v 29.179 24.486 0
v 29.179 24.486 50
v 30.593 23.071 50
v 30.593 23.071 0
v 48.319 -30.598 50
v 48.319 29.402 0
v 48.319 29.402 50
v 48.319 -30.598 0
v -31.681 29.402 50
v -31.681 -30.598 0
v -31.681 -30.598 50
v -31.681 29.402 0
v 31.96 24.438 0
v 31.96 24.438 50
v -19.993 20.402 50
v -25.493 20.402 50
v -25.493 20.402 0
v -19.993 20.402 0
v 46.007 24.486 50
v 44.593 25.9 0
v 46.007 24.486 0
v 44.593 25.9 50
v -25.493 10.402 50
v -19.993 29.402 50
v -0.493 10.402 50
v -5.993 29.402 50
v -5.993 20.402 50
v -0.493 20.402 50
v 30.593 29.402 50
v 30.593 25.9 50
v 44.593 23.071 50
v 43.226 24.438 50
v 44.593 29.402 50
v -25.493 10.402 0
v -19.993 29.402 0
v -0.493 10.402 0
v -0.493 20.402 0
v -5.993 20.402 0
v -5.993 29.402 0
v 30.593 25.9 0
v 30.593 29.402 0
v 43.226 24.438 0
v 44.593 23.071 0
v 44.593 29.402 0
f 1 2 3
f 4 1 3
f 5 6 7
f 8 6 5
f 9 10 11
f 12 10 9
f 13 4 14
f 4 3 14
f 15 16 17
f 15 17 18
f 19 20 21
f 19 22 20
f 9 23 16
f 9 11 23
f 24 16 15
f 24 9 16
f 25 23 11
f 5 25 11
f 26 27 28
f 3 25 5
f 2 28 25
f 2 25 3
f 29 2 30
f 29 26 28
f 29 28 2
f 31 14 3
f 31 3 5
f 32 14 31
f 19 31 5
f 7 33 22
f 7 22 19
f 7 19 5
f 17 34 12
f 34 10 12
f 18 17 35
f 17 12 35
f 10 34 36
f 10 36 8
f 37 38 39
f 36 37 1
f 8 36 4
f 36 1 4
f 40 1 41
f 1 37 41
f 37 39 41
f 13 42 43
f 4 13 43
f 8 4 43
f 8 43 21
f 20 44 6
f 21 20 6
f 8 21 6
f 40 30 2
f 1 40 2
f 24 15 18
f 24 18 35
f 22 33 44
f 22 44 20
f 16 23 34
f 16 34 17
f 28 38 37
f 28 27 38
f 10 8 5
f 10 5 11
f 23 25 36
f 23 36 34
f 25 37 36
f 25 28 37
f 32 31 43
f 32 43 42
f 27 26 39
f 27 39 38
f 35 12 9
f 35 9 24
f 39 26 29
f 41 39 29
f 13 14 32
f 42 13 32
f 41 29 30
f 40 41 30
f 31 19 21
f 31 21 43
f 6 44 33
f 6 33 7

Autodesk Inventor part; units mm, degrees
ref_plane "YZ Plane" through (0, 0, 0) normal (1, 0, 0) x (0, 1, 0)
ref_plane "XZ Plane" through (0, 0, 0) normal (0, 1, 0) x (-1, 0, 0)
ref_plane "XY Plane" through (0, 0, 0) normal (0, 0, 1) x (1, 0, 0)
sketch "Sketch1" plane through (0, 0, 0) normal (0, 0, 1) x (1, 0, 0)
  line L0 (-31.6809, 29.4017) -> (48.3191, 29.4017)
  line L1 (48.3191, 29.4017) -> (48.3191, -30.5983)
  line L2 (48.3191, -30.5983) -> (-31.6809, -30.5983)
  line L3 (-31.6809, -30.5983) -> (-31.6809, 29.4017)
  point P0 (0, 0)
  dimension "d0" = 80
  dimension "d1" = 60
extrude "Extrusion1" add sketch "Sketch1" along normal blind 50
sketch "Sketch2" plane through (0, 0, 50) normal (0, 0, 1) x (1, 0, 0)
  line L0 (-19.9929, 29.4017) -> (-5.9929, 29.4017)
  line L1 (-5.9929, 29.4017) -> (-5.9929, 20.4017)
  line L2 (-5.9929, 20.4017) -> (-0.4929, 20.4017)
  line L3 (-0.4929, 20.4017) -> (-0.4929, 10.4017)
  line L4 (-0.4929, 10.4017) -> (-25.4929, 10.4017)
  line L5 (-25.4929, 10.4017) -> (-25.4929, 20.4017)
  line L6 (-25.4929, 20.4017) -> (-19.9929, 20.4017)
  line L7 (-19.9929, 20.4017) -> (-19.9929, 29.4017)
  line L8 (48.3191, 29.4017) -> (-31.6809, 29.4017) projected
  point P0 (0, 0)
  point P1 (-12.9929, 29.4017)
  dimension "d4" = 25
  dimension "d5" = 12.5
  dimension "d6" = 7
  dimension "d7" = 14
  dimension "d8" = 9
  dimension "d9" = 10
extrude "Extrusion2" cut sketch "Sketch2" against normal blind 50
sketch "Sketch3" plane through (0, 0, 50) normal (0, 0, 1) x (1, 0, 0)
  line L0 (37.593, 29.4385) -> (44.593, 29.4385)
  line L1 (44.593, 29.4385) -> (44.593, 25.8997)
  line L2 (44.593, 25.8997) -> (46.0072, 24.4855)
  line L3 (46.0072, 24.4855) -> (44.593, 23.0713)
  line L4 (44.593, 23.0713) -> (43.2258, 24.4385)
  line L5 (43.2258, 24.4385) -> (37.593, 24.4385)
  line L6 (37.593, 29.4385) -> (37.593, 24.4385) construction
  line L7 (37.593, 29.4385) -> (30.593, 29.4385)
  line L8 (30.593, 29.4385) -> (30.593, 25.8997)
  line L9 (30.593, 25.8997) -> (29.1788, 24.4855)
  line L10 (29.1788, 24.4855) -> (30.593, 23.0713)
  line L11 (30.593, 23.0713) -> (31.9602, 24.4385)
  line L12 (31.9602, 24.4385) -> (37.593, 24.4385)
  point P0 (0, 0)
  point P1 (31.0916, 30.5867)
  dimension "d23" = 7
  dimension "d24" = 2
  dimension "d26" = 2
  dimension "d27" = 135
  dimension "d28" = 5
extrude "Extrusion3" cut sketch "Sketch3" against normal blind 50
properties part number "PiesaSuportCanale"
